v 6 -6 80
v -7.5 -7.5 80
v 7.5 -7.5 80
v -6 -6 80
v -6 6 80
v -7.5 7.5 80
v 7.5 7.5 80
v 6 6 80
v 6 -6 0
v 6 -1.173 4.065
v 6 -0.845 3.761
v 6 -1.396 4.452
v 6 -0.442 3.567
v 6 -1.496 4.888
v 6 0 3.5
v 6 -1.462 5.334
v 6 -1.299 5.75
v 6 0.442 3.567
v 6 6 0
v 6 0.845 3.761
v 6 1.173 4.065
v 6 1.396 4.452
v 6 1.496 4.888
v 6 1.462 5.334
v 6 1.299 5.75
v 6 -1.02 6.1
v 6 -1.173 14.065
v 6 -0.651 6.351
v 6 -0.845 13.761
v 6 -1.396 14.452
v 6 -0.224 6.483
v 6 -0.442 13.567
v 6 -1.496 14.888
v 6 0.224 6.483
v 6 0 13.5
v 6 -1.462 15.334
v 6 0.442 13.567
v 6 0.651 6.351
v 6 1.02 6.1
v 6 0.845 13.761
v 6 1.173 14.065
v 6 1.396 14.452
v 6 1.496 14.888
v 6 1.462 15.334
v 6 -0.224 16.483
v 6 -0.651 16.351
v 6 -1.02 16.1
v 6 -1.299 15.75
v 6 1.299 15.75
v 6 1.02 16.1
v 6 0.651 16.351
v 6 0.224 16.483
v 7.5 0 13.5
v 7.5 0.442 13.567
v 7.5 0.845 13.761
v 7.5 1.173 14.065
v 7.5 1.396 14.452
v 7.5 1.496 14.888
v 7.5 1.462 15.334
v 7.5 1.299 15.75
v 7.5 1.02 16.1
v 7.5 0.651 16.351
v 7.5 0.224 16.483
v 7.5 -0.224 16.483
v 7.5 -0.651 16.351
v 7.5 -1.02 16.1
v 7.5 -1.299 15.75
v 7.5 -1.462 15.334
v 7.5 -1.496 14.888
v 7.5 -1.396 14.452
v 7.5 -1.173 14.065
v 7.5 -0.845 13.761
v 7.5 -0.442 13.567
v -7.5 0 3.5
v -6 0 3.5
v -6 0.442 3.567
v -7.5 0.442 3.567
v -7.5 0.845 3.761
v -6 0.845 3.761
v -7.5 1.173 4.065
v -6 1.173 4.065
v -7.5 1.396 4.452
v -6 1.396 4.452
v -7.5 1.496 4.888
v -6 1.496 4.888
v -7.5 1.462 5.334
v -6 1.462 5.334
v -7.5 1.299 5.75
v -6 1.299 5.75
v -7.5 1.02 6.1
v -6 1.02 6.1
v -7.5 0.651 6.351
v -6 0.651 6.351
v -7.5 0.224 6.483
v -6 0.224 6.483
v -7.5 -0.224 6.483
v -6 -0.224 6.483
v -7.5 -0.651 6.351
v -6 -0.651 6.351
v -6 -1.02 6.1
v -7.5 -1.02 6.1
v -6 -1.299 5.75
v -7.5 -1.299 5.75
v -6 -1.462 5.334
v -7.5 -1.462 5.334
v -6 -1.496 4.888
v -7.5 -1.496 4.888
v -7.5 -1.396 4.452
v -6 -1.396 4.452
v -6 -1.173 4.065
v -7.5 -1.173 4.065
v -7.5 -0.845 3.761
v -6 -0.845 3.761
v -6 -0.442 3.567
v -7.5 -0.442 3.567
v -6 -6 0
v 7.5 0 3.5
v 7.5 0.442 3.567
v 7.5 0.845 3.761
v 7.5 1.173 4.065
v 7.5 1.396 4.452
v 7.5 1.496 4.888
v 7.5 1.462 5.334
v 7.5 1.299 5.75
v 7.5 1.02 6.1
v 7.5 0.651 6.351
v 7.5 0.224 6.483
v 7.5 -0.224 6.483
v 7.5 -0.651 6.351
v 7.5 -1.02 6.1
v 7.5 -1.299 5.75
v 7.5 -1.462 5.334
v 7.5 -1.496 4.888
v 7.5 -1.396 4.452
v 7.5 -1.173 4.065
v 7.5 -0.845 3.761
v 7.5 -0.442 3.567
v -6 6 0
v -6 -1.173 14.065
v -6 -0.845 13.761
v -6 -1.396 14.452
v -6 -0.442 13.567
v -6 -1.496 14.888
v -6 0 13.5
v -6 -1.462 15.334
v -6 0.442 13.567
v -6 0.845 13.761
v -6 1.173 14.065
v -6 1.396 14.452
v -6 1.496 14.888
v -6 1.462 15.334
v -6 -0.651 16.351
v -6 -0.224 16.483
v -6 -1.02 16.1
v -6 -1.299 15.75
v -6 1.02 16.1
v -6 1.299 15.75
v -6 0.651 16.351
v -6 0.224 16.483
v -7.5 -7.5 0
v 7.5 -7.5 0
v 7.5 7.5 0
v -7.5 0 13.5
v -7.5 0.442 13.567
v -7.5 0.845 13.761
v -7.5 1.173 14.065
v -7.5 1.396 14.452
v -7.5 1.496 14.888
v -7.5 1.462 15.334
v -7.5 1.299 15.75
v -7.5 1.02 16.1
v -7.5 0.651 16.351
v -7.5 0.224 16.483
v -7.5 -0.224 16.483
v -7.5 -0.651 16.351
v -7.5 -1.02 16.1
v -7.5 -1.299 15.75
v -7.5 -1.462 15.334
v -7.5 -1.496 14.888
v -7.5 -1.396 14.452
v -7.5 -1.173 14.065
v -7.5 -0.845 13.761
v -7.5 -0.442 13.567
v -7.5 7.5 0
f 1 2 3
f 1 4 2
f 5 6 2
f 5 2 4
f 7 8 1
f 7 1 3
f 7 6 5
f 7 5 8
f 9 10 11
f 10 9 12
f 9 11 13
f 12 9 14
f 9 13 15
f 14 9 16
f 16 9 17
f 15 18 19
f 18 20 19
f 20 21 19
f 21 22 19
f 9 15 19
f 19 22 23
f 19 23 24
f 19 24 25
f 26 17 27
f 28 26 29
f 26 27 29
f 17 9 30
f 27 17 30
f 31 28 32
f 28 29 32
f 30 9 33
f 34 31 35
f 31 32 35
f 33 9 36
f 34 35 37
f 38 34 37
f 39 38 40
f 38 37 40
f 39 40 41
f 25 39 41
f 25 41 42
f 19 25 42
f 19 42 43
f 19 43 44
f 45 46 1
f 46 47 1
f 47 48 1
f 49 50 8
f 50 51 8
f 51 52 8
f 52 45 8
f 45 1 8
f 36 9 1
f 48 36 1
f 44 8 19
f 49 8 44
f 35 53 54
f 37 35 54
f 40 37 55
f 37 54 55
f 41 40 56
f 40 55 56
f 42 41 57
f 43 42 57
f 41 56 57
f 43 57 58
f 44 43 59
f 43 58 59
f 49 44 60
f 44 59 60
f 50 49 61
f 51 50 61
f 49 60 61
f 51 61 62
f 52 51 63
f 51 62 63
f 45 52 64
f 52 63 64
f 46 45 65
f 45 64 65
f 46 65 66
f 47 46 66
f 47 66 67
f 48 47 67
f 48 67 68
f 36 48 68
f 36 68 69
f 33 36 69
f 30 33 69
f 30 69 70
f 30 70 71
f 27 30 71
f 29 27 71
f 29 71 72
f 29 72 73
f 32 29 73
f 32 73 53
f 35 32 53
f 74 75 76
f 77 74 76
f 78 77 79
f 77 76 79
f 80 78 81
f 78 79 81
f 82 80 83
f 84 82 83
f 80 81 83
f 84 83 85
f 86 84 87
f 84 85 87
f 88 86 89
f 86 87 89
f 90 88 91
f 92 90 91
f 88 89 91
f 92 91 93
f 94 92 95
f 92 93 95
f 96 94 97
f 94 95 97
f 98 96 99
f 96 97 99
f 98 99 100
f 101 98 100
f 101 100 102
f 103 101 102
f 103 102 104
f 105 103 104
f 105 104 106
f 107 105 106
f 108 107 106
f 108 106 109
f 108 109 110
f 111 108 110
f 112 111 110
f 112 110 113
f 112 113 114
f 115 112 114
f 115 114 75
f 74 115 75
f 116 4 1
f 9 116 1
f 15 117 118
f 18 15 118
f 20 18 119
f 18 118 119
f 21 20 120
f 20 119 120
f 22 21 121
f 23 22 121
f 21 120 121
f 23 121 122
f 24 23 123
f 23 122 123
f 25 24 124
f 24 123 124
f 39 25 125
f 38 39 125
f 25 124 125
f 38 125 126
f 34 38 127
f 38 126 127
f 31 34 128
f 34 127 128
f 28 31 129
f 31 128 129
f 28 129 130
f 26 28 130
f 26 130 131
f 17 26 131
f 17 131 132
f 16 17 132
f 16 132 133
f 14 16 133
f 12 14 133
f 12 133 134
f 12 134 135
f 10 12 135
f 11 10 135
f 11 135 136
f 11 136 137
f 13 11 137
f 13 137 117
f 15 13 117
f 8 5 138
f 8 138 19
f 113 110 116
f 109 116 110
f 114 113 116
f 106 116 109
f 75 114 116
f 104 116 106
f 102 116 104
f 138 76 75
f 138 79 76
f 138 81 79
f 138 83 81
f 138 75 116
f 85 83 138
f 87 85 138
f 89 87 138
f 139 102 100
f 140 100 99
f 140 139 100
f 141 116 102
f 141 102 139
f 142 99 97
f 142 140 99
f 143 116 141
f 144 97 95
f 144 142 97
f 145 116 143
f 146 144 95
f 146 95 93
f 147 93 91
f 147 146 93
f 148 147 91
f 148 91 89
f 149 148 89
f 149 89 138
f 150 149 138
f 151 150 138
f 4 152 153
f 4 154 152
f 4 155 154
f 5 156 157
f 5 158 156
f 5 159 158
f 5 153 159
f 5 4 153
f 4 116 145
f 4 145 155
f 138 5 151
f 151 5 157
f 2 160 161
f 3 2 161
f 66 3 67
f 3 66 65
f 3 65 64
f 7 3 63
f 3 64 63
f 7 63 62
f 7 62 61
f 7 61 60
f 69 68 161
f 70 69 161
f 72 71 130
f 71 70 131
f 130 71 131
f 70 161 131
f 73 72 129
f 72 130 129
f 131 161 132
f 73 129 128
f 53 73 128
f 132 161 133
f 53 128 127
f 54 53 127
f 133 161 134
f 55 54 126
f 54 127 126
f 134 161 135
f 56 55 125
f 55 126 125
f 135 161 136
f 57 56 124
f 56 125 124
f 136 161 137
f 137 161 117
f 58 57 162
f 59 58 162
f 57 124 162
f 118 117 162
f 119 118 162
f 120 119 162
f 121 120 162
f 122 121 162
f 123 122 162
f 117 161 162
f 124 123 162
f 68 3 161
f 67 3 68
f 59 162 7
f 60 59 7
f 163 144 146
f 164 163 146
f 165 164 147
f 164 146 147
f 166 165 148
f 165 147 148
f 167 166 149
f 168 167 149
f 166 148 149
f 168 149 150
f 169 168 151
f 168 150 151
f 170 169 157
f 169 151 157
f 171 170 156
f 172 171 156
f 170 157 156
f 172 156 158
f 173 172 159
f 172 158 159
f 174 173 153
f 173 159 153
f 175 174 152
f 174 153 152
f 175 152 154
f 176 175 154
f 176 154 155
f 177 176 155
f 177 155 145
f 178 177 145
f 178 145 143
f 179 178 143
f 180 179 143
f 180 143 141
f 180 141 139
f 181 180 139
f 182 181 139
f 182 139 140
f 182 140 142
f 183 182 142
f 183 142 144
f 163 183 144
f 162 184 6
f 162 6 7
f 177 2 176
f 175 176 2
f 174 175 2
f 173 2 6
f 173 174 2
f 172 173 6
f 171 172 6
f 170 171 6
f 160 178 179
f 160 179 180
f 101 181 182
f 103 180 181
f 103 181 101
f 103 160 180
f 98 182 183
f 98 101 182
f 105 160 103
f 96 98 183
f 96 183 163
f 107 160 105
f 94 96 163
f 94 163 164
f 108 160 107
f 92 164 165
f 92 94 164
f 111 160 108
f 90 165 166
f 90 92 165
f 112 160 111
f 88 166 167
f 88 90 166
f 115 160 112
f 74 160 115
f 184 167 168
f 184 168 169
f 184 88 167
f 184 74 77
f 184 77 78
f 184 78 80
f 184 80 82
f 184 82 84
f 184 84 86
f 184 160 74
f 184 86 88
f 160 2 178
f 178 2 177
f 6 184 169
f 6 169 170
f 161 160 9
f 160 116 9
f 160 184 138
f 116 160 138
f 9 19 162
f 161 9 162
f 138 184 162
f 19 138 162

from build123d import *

# Parameters (mm, degrees)
ESQUISSE1_W             = 15
ESQUISSE1_H             = 15
EXTRUSION1_DEPTH        = 80
ESQUISSE2_W             = 12
ESQUISSE2_H             = 12
EXTRUSION2_DEPTH        = 81.700061958
ESQUISSE3_R             = 1.5
ENL_V_MAT_EXTRU_1_DEPTH = 82.738913621


with BuildPart() as part:
    # Esquisse1 → Extrusion1 (new body)
    with BuildSketch(Plane.XY):
        Rectangle(ESQUISSE1_W, ESQUISSE1_H)
    extrude(amount=EXTRUSION1_DEPTH)

    # Esquisse2 → Extrusion2 (cut, through all)
    with BuildSketch(Plane.XY.offset(80)):
        Rectangle(ESQUISSE2_W, ESQUISSE2_H)
    extrude(amount=-EXTRUSION2_DEPTH, mode=Mode.SUBTRACT)

    # Esquisse3 → Enlèv. mat.-Extru.1 (cut, through all)
    with BuildSketch(Plane(origin=(7.5, 0, 0), x_dir=(0, 0, -1), z_dir=(1, 0, 0))):
        with Locations((-5, 0)):
            Circle(ESQUISSE3_R)
        with Locations((-15, 0)):
            Circle(ESQUISSE3_R)
    extrude(amount=-ENL_V_MAT_EXTRU_1_DEPTH, mode=Mode.SUBTRACT)


solid = part.part
